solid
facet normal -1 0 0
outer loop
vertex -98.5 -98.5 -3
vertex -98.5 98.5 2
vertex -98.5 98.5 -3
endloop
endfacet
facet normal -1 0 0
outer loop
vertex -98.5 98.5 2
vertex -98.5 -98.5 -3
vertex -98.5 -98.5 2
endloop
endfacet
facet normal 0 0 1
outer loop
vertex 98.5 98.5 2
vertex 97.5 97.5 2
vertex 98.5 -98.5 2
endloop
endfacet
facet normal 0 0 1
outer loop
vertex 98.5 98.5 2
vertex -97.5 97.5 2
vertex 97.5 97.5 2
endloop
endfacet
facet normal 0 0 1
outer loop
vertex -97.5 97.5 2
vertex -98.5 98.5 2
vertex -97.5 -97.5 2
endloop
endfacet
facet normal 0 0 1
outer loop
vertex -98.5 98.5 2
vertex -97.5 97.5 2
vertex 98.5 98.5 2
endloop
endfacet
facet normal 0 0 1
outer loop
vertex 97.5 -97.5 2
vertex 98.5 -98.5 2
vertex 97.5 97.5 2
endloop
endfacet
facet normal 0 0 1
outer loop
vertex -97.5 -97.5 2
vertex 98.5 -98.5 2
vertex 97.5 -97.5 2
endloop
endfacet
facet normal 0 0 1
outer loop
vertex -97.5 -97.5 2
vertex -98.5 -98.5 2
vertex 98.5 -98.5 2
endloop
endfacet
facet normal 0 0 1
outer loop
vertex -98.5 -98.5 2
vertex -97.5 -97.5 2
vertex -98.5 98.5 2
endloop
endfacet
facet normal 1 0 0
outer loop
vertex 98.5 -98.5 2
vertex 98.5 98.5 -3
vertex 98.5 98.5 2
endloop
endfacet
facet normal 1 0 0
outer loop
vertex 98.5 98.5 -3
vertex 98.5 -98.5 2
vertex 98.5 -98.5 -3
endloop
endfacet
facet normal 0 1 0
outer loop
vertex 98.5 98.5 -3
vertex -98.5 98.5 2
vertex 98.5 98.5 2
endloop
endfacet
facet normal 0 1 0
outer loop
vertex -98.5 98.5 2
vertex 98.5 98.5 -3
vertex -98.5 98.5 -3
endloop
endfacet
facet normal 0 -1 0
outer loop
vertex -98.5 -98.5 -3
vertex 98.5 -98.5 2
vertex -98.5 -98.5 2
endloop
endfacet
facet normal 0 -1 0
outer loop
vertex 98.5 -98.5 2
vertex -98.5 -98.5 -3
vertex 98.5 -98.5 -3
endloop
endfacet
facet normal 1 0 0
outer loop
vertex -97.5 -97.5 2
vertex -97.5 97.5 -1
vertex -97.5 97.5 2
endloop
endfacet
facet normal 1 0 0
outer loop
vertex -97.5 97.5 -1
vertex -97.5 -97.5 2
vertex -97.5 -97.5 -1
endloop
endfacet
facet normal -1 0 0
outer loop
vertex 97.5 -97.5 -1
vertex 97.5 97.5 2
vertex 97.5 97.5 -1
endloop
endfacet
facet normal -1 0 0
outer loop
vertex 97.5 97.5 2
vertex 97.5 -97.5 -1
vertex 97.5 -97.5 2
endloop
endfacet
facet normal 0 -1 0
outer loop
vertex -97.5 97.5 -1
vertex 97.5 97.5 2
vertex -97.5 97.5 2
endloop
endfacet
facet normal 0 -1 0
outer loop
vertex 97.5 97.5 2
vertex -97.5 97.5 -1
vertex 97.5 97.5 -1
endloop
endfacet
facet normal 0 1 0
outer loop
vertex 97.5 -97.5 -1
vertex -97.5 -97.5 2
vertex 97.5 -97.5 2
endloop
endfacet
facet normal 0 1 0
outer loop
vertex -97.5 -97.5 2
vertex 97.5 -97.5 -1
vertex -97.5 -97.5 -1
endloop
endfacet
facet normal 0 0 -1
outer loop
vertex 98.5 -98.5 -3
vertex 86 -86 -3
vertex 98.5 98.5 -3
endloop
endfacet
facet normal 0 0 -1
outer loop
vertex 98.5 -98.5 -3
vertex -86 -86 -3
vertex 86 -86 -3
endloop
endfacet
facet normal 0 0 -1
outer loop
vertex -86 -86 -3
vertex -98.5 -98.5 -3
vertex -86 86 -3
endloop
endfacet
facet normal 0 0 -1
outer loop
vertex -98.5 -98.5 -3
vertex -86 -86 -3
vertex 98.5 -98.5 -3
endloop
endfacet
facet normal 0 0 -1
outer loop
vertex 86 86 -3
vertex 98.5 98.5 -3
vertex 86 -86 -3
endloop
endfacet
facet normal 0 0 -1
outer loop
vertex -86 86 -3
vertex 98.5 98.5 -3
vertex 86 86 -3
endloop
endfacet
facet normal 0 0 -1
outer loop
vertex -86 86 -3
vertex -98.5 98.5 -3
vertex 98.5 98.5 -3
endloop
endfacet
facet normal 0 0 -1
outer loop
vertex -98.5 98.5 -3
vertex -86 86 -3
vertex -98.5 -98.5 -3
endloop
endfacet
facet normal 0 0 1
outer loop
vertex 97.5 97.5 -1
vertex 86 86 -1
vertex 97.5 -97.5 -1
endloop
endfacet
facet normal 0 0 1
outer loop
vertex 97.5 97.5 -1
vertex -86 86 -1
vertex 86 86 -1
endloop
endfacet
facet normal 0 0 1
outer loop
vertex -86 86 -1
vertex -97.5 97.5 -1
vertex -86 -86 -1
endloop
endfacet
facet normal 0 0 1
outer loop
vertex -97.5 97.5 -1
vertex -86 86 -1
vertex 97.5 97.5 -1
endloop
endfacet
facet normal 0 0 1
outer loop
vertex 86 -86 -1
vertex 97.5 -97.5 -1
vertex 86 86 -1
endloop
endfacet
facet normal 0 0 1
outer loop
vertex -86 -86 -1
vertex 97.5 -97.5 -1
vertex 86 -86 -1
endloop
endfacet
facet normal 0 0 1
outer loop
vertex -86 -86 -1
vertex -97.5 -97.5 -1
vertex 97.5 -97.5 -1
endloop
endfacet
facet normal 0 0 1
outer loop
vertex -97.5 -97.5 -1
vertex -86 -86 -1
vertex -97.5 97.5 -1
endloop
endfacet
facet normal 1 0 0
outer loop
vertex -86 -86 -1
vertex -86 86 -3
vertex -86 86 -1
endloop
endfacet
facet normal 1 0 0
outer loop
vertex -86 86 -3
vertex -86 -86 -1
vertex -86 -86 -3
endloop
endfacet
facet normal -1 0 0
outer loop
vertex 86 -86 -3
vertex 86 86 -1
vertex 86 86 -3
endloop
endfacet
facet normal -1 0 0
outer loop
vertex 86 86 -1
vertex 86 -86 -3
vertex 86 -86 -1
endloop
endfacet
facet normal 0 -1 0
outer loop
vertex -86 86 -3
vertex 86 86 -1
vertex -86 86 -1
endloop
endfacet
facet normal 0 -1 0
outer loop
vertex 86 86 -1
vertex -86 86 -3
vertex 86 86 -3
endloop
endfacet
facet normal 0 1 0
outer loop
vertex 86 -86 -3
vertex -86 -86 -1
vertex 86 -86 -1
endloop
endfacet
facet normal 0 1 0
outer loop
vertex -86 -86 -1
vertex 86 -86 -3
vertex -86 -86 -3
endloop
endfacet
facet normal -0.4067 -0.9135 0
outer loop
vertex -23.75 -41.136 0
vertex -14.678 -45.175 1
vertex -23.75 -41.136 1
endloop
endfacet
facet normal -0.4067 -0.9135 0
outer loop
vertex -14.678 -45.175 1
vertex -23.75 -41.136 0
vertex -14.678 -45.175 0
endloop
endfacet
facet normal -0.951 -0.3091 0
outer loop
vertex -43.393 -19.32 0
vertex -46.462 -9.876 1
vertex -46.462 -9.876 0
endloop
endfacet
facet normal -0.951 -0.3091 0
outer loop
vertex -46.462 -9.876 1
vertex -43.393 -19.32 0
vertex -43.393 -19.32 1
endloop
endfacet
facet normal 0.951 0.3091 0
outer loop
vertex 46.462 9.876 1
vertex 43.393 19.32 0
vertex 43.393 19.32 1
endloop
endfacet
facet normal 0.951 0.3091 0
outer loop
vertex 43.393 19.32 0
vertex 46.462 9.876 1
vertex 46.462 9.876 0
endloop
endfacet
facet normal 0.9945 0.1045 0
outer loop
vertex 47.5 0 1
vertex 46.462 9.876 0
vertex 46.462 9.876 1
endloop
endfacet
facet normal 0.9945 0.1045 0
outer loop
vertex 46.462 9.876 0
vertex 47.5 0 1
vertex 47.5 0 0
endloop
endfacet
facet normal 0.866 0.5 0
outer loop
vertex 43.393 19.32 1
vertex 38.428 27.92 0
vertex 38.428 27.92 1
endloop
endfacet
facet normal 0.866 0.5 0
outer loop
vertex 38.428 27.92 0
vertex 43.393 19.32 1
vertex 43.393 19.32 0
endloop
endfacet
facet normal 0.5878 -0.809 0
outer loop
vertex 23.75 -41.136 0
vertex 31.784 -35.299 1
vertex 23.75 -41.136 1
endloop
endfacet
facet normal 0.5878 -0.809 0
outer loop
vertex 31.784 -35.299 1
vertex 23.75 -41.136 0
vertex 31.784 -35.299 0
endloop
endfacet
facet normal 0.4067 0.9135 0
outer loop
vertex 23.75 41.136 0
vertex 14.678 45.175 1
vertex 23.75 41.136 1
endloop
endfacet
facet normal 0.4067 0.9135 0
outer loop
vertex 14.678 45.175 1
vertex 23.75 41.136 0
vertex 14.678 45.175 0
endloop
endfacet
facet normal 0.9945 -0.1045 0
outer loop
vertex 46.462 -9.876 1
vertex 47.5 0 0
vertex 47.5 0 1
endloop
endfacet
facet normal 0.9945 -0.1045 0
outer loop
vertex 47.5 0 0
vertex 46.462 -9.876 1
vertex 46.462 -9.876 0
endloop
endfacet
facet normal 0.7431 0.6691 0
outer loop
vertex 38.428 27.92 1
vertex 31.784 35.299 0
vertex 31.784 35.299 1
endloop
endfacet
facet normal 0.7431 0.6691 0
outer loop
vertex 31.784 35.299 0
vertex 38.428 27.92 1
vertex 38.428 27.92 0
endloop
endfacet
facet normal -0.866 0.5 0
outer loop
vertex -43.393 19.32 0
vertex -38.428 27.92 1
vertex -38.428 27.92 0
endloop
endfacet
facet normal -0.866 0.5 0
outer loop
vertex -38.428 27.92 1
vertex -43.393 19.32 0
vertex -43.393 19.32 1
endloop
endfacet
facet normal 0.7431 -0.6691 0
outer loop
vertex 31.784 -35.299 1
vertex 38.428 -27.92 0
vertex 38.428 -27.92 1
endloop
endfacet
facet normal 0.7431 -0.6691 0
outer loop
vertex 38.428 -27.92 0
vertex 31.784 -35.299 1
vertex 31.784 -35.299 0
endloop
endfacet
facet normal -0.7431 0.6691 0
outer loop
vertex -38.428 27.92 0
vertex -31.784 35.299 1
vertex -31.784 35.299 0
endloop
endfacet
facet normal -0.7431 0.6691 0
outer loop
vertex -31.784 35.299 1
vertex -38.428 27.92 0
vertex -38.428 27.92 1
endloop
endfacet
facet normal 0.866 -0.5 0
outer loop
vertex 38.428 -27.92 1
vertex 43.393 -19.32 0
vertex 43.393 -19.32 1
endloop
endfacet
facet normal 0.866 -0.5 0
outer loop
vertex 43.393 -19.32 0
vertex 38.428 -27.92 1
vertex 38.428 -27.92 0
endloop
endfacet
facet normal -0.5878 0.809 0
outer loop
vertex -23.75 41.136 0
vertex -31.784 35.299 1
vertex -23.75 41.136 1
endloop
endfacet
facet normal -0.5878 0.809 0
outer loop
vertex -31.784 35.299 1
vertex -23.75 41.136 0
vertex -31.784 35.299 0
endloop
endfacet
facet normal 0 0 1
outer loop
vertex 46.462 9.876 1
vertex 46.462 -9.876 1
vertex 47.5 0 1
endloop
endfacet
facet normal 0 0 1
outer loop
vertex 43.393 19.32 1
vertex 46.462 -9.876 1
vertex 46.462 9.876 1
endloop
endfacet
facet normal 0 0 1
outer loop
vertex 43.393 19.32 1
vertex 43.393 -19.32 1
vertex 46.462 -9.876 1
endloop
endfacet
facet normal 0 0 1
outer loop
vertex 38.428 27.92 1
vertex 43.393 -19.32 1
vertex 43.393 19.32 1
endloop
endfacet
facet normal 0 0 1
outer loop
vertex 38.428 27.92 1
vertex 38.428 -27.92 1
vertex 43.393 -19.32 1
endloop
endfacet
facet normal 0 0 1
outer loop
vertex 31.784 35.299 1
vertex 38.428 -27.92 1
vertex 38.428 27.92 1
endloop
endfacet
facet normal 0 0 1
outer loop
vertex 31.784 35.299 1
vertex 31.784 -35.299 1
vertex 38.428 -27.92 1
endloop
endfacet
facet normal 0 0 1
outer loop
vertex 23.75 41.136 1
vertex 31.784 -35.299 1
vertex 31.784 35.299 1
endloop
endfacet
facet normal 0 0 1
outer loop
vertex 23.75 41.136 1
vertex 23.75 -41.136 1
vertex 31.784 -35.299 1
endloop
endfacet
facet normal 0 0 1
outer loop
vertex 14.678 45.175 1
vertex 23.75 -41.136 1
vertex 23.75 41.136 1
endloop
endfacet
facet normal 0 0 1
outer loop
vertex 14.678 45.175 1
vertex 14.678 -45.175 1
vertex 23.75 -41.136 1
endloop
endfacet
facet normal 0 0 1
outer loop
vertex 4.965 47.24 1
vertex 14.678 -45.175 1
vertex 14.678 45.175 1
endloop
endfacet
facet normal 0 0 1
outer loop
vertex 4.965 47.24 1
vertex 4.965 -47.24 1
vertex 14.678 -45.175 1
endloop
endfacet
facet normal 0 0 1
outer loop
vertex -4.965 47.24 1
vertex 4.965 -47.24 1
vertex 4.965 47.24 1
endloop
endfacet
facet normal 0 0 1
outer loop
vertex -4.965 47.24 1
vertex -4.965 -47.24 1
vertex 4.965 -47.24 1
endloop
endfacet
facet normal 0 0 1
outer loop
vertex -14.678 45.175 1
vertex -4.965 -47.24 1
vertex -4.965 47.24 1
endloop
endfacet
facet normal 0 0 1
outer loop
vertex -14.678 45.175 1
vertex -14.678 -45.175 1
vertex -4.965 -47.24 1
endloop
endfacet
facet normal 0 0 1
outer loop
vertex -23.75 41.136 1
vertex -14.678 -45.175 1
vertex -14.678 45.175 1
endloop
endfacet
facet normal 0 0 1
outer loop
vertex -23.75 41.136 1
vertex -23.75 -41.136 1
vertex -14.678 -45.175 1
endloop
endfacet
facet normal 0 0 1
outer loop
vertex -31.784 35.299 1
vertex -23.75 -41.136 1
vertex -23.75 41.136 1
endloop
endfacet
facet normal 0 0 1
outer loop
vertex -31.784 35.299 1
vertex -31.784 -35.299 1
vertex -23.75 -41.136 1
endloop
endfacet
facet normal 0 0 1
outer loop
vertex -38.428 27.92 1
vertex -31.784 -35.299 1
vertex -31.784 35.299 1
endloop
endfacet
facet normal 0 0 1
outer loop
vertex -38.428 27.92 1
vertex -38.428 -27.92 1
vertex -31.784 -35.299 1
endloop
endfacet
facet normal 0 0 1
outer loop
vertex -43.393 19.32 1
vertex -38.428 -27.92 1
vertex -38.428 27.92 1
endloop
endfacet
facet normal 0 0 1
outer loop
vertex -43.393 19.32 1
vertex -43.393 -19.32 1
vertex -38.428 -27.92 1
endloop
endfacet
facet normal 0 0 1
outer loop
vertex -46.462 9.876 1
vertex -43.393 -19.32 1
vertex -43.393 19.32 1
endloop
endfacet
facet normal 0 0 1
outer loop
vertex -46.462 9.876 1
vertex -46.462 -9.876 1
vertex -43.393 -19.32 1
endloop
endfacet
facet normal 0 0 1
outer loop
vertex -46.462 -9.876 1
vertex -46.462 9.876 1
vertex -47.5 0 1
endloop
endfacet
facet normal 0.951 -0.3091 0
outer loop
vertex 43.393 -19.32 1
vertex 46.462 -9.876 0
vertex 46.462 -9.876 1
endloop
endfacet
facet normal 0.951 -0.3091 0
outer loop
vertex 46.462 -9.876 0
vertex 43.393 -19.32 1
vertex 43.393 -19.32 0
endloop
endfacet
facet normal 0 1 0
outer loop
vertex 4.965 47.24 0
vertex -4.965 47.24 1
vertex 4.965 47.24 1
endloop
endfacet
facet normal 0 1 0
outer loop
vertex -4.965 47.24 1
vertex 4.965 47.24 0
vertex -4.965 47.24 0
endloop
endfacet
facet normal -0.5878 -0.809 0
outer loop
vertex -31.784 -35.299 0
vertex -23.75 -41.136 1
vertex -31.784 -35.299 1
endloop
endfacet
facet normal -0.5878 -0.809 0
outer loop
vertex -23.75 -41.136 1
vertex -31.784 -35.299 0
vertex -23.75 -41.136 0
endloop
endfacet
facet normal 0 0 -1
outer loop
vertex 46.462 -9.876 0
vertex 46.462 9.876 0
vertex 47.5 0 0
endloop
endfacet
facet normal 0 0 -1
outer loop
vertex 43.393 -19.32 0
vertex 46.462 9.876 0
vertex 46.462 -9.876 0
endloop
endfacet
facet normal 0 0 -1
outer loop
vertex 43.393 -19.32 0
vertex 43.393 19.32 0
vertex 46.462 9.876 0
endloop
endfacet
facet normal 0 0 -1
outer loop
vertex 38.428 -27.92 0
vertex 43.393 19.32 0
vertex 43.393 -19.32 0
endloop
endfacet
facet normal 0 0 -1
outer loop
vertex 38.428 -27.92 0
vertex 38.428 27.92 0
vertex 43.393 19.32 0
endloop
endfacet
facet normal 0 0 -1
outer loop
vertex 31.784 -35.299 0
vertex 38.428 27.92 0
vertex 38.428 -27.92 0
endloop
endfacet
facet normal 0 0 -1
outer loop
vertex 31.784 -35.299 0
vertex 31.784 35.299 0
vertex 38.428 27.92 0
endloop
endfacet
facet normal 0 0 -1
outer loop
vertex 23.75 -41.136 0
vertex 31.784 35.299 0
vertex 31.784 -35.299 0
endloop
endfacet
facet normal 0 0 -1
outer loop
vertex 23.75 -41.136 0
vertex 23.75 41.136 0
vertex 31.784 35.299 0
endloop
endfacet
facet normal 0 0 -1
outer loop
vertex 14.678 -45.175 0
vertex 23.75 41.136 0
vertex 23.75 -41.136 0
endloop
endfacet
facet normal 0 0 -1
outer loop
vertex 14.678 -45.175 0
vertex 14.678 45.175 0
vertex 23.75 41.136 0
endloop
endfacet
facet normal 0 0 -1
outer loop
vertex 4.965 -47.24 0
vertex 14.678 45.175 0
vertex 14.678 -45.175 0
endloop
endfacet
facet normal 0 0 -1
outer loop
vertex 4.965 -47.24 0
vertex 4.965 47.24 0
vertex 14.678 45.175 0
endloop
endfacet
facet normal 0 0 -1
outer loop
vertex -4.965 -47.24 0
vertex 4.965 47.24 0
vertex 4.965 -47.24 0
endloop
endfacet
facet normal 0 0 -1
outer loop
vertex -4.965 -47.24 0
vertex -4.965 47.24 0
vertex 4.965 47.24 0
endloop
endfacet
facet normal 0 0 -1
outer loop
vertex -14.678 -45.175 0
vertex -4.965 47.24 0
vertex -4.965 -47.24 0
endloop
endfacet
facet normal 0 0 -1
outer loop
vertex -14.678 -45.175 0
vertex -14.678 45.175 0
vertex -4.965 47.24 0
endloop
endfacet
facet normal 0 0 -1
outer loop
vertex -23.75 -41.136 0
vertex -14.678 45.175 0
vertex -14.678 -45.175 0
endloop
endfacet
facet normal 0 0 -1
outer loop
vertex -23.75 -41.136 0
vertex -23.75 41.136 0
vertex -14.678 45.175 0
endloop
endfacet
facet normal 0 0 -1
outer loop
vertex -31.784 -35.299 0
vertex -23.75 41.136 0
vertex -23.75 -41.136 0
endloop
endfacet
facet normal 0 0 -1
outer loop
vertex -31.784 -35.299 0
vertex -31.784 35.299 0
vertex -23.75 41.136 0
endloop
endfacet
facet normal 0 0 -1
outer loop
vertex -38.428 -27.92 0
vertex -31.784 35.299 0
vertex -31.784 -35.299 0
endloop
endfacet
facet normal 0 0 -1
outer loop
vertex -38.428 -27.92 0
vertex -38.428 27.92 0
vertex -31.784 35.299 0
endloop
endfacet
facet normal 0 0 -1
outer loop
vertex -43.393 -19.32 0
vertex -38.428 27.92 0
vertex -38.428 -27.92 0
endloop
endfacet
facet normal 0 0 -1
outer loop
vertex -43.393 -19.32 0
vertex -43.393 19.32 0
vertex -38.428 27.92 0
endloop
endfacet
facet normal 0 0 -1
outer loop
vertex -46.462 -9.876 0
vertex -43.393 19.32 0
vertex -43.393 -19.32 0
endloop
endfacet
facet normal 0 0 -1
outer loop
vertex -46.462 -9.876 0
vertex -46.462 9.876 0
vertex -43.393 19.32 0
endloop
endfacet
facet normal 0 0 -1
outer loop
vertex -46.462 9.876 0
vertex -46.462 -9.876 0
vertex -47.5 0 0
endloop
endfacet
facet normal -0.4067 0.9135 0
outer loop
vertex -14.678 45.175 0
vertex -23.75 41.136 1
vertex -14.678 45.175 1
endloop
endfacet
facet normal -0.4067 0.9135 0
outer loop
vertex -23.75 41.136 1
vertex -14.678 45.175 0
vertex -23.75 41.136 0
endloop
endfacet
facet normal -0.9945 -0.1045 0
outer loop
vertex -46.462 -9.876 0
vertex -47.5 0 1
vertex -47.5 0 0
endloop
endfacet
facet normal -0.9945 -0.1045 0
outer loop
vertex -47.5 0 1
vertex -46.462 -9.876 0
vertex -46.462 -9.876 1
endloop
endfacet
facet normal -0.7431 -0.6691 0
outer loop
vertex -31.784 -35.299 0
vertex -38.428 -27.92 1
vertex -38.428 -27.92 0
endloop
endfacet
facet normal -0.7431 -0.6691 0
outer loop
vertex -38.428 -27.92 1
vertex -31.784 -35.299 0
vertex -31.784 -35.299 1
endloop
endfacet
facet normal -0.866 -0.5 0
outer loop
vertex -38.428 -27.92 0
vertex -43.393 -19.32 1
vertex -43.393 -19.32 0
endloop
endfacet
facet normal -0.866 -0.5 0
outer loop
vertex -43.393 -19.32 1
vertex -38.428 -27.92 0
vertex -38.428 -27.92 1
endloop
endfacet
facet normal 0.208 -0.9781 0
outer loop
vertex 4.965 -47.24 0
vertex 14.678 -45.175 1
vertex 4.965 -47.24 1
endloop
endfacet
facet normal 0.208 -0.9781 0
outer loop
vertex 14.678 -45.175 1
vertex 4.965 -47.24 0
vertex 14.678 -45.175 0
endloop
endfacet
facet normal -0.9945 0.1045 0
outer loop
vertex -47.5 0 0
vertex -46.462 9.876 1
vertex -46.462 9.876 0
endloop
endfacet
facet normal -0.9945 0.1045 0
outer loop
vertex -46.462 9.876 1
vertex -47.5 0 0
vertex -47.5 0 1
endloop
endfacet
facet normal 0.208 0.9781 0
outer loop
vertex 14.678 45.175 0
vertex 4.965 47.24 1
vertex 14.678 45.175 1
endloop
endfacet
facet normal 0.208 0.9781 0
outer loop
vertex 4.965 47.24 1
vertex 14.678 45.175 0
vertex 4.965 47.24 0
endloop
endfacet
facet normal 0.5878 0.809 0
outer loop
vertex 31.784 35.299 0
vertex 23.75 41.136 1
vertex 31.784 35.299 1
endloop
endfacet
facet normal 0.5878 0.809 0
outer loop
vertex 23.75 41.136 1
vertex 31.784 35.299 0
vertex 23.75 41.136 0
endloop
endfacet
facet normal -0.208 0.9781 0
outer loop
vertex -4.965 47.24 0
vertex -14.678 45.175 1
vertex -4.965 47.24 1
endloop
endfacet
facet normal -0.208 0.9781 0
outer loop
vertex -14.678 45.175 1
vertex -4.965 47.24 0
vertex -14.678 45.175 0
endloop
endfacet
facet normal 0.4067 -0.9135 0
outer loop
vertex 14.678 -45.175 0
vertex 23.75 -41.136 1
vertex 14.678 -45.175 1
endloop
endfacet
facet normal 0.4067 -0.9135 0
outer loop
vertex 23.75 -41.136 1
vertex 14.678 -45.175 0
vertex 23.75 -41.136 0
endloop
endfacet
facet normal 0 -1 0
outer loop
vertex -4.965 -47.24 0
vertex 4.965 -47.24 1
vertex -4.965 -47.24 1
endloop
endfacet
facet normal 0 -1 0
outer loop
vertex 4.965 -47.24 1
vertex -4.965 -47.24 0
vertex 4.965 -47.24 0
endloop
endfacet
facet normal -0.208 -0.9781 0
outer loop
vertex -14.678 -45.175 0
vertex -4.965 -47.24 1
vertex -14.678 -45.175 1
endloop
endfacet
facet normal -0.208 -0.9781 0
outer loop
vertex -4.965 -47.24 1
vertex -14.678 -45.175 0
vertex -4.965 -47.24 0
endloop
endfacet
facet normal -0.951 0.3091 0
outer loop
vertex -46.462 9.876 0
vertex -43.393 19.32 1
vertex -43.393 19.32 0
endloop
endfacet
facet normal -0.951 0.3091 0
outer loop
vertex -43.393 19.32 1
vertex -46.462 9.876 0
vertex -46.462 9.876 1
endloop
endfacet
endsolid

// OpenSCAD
BoxTopLength=197;
BoxTopWidth=197;
LipHeight=4;
LipThickness=2;
LipOverHangWidth=25;
BoxTopThickness=2;
IsOpenTop=true;


//meshX=26;
meshY=18;
meshZ=40;
Seedrows=4;
Seedcolumns=4;

spokeCount=24;
spokerows=8;
spokeDia=15;
spokeY=2;
wallWidth=2;

//module lip(x,y,wall, height)
//{
//     translate([x/2,y/2,height/2]) difference()
//    {
//    cube([x,y,height],true);
//    cube([x-wall,y-wall,height+1], true);
//    }
//}

//module overlap(x,y,thickness, base)
module overlap(boxTopLength, boxTopWidth, boxTopThickness, lipHeight, lipThickness)
{
    echo(boxTop=4,boxTopLength=boxTopLength, boxTopWidth=boxTopWidth, boxTopThickness=boxTopThickness, lipHeight=lipHeight, lipThickness=lipThickness);
    
    height=boxTopThickness;
    
    echo(boxTopLength=boxTopLength, boxTopWidth=boxTopWidth, lipThickness=lipThickness, lipHeight=lipHeight);
    echo("pink", boxTopLength-lipHeight);
    
    //Box Top Lip
    difference()
    {
     color("red")  cube([boxTopLength,boxTopWidth,lipHeight],true);
     color("pink") cube([boxTopLength-lipThickness,boxTopWidth-lipThickness,lipHeight+2],true);   
    }
    
    //Lid portion of box top.
        translate([0,0,lipHeight/2]) color("blue") cube([boxTopLength,boxTopWidth,boxTopThickness],true);

//    //translate([0,0,lipHeight]) difference()
//    {
//    color("blue") cube([boxTopLength,boxTopWidth,boxTopThickness],true);
//    //color("lightblue") cube([boxTopLength-lipThickness,boxTopWidth-lipThickness,boxTopThickness+1], true);
//    }
}

//module reservoir(x,y,wall, height)
//{
//    //resize([0,0,0]) 
//    translate([x/2,y/2,0]) 
//    cube([x,y,wall],true);
//    difference()
//    {
//    lip(x,y,wall,height);
//    color("blue") translate([-5,y/2,height-(meshZ/2)])
//    rotate(a=180, v=[1,0,1]) cylinder(20,5,5, false);
//    }
//    
//}


module BoxTop(boxTopLength, boxTopWidth, boxTopThickness, lipHeight, lipThickness, isOpenTop, lipOverHangWidth)
{
    echo(boxTop=3,boxTopLength=boxTopLength, boxTopWidth=boxTopWidth, boxTopThickness=boxTopThickness, lipHeight=lipHeight, lipThickness=lipThickness, isOpenTop=isOpenTop, lipOverHangWidth=lipOverHangWidth);
    
        if(isOpenTop)
        {
            rotate([0,180,0]) difference()
            {
                //module overlap(boxTopLength, boxTopWidth, boxTopThickness, lipHeight, lipThickness)
                overlap(boxTopLength, boxTopWidth, boxTopThickness, lipHeight, lipThickness);
                translate(0,0,-2) cube([boxTopLength-lipOverHangWidth,boxTopWidth-lipOverHangWidth,lipHeight+7],true);
            }            
            translate(0,0,-4) color("pink") cylinder(h=lipHeight+7, r= 47.5,true);
        }
        else
        {
            overlap(boxTopLength, boxTopWidth, boxTopThickness, lipHeight, lipThickness);
        }
}

echo(BoxTopLength=BoxTopLength, BoxTopWidth=BoxTopWidth, BoxTopThickness=BoxTopThickness, LipHeight=LipHeight, LipThickness=LipThickness, IsOpenTop=IsOpenTop, LipOverHangWidth=LipOverHangWidth);

BoxTop(BoxTopLength, BoxTopWidth, BoxTopThickness, LipHeight, LipThickness, IsOpenTop, LipOverHangWidth);
